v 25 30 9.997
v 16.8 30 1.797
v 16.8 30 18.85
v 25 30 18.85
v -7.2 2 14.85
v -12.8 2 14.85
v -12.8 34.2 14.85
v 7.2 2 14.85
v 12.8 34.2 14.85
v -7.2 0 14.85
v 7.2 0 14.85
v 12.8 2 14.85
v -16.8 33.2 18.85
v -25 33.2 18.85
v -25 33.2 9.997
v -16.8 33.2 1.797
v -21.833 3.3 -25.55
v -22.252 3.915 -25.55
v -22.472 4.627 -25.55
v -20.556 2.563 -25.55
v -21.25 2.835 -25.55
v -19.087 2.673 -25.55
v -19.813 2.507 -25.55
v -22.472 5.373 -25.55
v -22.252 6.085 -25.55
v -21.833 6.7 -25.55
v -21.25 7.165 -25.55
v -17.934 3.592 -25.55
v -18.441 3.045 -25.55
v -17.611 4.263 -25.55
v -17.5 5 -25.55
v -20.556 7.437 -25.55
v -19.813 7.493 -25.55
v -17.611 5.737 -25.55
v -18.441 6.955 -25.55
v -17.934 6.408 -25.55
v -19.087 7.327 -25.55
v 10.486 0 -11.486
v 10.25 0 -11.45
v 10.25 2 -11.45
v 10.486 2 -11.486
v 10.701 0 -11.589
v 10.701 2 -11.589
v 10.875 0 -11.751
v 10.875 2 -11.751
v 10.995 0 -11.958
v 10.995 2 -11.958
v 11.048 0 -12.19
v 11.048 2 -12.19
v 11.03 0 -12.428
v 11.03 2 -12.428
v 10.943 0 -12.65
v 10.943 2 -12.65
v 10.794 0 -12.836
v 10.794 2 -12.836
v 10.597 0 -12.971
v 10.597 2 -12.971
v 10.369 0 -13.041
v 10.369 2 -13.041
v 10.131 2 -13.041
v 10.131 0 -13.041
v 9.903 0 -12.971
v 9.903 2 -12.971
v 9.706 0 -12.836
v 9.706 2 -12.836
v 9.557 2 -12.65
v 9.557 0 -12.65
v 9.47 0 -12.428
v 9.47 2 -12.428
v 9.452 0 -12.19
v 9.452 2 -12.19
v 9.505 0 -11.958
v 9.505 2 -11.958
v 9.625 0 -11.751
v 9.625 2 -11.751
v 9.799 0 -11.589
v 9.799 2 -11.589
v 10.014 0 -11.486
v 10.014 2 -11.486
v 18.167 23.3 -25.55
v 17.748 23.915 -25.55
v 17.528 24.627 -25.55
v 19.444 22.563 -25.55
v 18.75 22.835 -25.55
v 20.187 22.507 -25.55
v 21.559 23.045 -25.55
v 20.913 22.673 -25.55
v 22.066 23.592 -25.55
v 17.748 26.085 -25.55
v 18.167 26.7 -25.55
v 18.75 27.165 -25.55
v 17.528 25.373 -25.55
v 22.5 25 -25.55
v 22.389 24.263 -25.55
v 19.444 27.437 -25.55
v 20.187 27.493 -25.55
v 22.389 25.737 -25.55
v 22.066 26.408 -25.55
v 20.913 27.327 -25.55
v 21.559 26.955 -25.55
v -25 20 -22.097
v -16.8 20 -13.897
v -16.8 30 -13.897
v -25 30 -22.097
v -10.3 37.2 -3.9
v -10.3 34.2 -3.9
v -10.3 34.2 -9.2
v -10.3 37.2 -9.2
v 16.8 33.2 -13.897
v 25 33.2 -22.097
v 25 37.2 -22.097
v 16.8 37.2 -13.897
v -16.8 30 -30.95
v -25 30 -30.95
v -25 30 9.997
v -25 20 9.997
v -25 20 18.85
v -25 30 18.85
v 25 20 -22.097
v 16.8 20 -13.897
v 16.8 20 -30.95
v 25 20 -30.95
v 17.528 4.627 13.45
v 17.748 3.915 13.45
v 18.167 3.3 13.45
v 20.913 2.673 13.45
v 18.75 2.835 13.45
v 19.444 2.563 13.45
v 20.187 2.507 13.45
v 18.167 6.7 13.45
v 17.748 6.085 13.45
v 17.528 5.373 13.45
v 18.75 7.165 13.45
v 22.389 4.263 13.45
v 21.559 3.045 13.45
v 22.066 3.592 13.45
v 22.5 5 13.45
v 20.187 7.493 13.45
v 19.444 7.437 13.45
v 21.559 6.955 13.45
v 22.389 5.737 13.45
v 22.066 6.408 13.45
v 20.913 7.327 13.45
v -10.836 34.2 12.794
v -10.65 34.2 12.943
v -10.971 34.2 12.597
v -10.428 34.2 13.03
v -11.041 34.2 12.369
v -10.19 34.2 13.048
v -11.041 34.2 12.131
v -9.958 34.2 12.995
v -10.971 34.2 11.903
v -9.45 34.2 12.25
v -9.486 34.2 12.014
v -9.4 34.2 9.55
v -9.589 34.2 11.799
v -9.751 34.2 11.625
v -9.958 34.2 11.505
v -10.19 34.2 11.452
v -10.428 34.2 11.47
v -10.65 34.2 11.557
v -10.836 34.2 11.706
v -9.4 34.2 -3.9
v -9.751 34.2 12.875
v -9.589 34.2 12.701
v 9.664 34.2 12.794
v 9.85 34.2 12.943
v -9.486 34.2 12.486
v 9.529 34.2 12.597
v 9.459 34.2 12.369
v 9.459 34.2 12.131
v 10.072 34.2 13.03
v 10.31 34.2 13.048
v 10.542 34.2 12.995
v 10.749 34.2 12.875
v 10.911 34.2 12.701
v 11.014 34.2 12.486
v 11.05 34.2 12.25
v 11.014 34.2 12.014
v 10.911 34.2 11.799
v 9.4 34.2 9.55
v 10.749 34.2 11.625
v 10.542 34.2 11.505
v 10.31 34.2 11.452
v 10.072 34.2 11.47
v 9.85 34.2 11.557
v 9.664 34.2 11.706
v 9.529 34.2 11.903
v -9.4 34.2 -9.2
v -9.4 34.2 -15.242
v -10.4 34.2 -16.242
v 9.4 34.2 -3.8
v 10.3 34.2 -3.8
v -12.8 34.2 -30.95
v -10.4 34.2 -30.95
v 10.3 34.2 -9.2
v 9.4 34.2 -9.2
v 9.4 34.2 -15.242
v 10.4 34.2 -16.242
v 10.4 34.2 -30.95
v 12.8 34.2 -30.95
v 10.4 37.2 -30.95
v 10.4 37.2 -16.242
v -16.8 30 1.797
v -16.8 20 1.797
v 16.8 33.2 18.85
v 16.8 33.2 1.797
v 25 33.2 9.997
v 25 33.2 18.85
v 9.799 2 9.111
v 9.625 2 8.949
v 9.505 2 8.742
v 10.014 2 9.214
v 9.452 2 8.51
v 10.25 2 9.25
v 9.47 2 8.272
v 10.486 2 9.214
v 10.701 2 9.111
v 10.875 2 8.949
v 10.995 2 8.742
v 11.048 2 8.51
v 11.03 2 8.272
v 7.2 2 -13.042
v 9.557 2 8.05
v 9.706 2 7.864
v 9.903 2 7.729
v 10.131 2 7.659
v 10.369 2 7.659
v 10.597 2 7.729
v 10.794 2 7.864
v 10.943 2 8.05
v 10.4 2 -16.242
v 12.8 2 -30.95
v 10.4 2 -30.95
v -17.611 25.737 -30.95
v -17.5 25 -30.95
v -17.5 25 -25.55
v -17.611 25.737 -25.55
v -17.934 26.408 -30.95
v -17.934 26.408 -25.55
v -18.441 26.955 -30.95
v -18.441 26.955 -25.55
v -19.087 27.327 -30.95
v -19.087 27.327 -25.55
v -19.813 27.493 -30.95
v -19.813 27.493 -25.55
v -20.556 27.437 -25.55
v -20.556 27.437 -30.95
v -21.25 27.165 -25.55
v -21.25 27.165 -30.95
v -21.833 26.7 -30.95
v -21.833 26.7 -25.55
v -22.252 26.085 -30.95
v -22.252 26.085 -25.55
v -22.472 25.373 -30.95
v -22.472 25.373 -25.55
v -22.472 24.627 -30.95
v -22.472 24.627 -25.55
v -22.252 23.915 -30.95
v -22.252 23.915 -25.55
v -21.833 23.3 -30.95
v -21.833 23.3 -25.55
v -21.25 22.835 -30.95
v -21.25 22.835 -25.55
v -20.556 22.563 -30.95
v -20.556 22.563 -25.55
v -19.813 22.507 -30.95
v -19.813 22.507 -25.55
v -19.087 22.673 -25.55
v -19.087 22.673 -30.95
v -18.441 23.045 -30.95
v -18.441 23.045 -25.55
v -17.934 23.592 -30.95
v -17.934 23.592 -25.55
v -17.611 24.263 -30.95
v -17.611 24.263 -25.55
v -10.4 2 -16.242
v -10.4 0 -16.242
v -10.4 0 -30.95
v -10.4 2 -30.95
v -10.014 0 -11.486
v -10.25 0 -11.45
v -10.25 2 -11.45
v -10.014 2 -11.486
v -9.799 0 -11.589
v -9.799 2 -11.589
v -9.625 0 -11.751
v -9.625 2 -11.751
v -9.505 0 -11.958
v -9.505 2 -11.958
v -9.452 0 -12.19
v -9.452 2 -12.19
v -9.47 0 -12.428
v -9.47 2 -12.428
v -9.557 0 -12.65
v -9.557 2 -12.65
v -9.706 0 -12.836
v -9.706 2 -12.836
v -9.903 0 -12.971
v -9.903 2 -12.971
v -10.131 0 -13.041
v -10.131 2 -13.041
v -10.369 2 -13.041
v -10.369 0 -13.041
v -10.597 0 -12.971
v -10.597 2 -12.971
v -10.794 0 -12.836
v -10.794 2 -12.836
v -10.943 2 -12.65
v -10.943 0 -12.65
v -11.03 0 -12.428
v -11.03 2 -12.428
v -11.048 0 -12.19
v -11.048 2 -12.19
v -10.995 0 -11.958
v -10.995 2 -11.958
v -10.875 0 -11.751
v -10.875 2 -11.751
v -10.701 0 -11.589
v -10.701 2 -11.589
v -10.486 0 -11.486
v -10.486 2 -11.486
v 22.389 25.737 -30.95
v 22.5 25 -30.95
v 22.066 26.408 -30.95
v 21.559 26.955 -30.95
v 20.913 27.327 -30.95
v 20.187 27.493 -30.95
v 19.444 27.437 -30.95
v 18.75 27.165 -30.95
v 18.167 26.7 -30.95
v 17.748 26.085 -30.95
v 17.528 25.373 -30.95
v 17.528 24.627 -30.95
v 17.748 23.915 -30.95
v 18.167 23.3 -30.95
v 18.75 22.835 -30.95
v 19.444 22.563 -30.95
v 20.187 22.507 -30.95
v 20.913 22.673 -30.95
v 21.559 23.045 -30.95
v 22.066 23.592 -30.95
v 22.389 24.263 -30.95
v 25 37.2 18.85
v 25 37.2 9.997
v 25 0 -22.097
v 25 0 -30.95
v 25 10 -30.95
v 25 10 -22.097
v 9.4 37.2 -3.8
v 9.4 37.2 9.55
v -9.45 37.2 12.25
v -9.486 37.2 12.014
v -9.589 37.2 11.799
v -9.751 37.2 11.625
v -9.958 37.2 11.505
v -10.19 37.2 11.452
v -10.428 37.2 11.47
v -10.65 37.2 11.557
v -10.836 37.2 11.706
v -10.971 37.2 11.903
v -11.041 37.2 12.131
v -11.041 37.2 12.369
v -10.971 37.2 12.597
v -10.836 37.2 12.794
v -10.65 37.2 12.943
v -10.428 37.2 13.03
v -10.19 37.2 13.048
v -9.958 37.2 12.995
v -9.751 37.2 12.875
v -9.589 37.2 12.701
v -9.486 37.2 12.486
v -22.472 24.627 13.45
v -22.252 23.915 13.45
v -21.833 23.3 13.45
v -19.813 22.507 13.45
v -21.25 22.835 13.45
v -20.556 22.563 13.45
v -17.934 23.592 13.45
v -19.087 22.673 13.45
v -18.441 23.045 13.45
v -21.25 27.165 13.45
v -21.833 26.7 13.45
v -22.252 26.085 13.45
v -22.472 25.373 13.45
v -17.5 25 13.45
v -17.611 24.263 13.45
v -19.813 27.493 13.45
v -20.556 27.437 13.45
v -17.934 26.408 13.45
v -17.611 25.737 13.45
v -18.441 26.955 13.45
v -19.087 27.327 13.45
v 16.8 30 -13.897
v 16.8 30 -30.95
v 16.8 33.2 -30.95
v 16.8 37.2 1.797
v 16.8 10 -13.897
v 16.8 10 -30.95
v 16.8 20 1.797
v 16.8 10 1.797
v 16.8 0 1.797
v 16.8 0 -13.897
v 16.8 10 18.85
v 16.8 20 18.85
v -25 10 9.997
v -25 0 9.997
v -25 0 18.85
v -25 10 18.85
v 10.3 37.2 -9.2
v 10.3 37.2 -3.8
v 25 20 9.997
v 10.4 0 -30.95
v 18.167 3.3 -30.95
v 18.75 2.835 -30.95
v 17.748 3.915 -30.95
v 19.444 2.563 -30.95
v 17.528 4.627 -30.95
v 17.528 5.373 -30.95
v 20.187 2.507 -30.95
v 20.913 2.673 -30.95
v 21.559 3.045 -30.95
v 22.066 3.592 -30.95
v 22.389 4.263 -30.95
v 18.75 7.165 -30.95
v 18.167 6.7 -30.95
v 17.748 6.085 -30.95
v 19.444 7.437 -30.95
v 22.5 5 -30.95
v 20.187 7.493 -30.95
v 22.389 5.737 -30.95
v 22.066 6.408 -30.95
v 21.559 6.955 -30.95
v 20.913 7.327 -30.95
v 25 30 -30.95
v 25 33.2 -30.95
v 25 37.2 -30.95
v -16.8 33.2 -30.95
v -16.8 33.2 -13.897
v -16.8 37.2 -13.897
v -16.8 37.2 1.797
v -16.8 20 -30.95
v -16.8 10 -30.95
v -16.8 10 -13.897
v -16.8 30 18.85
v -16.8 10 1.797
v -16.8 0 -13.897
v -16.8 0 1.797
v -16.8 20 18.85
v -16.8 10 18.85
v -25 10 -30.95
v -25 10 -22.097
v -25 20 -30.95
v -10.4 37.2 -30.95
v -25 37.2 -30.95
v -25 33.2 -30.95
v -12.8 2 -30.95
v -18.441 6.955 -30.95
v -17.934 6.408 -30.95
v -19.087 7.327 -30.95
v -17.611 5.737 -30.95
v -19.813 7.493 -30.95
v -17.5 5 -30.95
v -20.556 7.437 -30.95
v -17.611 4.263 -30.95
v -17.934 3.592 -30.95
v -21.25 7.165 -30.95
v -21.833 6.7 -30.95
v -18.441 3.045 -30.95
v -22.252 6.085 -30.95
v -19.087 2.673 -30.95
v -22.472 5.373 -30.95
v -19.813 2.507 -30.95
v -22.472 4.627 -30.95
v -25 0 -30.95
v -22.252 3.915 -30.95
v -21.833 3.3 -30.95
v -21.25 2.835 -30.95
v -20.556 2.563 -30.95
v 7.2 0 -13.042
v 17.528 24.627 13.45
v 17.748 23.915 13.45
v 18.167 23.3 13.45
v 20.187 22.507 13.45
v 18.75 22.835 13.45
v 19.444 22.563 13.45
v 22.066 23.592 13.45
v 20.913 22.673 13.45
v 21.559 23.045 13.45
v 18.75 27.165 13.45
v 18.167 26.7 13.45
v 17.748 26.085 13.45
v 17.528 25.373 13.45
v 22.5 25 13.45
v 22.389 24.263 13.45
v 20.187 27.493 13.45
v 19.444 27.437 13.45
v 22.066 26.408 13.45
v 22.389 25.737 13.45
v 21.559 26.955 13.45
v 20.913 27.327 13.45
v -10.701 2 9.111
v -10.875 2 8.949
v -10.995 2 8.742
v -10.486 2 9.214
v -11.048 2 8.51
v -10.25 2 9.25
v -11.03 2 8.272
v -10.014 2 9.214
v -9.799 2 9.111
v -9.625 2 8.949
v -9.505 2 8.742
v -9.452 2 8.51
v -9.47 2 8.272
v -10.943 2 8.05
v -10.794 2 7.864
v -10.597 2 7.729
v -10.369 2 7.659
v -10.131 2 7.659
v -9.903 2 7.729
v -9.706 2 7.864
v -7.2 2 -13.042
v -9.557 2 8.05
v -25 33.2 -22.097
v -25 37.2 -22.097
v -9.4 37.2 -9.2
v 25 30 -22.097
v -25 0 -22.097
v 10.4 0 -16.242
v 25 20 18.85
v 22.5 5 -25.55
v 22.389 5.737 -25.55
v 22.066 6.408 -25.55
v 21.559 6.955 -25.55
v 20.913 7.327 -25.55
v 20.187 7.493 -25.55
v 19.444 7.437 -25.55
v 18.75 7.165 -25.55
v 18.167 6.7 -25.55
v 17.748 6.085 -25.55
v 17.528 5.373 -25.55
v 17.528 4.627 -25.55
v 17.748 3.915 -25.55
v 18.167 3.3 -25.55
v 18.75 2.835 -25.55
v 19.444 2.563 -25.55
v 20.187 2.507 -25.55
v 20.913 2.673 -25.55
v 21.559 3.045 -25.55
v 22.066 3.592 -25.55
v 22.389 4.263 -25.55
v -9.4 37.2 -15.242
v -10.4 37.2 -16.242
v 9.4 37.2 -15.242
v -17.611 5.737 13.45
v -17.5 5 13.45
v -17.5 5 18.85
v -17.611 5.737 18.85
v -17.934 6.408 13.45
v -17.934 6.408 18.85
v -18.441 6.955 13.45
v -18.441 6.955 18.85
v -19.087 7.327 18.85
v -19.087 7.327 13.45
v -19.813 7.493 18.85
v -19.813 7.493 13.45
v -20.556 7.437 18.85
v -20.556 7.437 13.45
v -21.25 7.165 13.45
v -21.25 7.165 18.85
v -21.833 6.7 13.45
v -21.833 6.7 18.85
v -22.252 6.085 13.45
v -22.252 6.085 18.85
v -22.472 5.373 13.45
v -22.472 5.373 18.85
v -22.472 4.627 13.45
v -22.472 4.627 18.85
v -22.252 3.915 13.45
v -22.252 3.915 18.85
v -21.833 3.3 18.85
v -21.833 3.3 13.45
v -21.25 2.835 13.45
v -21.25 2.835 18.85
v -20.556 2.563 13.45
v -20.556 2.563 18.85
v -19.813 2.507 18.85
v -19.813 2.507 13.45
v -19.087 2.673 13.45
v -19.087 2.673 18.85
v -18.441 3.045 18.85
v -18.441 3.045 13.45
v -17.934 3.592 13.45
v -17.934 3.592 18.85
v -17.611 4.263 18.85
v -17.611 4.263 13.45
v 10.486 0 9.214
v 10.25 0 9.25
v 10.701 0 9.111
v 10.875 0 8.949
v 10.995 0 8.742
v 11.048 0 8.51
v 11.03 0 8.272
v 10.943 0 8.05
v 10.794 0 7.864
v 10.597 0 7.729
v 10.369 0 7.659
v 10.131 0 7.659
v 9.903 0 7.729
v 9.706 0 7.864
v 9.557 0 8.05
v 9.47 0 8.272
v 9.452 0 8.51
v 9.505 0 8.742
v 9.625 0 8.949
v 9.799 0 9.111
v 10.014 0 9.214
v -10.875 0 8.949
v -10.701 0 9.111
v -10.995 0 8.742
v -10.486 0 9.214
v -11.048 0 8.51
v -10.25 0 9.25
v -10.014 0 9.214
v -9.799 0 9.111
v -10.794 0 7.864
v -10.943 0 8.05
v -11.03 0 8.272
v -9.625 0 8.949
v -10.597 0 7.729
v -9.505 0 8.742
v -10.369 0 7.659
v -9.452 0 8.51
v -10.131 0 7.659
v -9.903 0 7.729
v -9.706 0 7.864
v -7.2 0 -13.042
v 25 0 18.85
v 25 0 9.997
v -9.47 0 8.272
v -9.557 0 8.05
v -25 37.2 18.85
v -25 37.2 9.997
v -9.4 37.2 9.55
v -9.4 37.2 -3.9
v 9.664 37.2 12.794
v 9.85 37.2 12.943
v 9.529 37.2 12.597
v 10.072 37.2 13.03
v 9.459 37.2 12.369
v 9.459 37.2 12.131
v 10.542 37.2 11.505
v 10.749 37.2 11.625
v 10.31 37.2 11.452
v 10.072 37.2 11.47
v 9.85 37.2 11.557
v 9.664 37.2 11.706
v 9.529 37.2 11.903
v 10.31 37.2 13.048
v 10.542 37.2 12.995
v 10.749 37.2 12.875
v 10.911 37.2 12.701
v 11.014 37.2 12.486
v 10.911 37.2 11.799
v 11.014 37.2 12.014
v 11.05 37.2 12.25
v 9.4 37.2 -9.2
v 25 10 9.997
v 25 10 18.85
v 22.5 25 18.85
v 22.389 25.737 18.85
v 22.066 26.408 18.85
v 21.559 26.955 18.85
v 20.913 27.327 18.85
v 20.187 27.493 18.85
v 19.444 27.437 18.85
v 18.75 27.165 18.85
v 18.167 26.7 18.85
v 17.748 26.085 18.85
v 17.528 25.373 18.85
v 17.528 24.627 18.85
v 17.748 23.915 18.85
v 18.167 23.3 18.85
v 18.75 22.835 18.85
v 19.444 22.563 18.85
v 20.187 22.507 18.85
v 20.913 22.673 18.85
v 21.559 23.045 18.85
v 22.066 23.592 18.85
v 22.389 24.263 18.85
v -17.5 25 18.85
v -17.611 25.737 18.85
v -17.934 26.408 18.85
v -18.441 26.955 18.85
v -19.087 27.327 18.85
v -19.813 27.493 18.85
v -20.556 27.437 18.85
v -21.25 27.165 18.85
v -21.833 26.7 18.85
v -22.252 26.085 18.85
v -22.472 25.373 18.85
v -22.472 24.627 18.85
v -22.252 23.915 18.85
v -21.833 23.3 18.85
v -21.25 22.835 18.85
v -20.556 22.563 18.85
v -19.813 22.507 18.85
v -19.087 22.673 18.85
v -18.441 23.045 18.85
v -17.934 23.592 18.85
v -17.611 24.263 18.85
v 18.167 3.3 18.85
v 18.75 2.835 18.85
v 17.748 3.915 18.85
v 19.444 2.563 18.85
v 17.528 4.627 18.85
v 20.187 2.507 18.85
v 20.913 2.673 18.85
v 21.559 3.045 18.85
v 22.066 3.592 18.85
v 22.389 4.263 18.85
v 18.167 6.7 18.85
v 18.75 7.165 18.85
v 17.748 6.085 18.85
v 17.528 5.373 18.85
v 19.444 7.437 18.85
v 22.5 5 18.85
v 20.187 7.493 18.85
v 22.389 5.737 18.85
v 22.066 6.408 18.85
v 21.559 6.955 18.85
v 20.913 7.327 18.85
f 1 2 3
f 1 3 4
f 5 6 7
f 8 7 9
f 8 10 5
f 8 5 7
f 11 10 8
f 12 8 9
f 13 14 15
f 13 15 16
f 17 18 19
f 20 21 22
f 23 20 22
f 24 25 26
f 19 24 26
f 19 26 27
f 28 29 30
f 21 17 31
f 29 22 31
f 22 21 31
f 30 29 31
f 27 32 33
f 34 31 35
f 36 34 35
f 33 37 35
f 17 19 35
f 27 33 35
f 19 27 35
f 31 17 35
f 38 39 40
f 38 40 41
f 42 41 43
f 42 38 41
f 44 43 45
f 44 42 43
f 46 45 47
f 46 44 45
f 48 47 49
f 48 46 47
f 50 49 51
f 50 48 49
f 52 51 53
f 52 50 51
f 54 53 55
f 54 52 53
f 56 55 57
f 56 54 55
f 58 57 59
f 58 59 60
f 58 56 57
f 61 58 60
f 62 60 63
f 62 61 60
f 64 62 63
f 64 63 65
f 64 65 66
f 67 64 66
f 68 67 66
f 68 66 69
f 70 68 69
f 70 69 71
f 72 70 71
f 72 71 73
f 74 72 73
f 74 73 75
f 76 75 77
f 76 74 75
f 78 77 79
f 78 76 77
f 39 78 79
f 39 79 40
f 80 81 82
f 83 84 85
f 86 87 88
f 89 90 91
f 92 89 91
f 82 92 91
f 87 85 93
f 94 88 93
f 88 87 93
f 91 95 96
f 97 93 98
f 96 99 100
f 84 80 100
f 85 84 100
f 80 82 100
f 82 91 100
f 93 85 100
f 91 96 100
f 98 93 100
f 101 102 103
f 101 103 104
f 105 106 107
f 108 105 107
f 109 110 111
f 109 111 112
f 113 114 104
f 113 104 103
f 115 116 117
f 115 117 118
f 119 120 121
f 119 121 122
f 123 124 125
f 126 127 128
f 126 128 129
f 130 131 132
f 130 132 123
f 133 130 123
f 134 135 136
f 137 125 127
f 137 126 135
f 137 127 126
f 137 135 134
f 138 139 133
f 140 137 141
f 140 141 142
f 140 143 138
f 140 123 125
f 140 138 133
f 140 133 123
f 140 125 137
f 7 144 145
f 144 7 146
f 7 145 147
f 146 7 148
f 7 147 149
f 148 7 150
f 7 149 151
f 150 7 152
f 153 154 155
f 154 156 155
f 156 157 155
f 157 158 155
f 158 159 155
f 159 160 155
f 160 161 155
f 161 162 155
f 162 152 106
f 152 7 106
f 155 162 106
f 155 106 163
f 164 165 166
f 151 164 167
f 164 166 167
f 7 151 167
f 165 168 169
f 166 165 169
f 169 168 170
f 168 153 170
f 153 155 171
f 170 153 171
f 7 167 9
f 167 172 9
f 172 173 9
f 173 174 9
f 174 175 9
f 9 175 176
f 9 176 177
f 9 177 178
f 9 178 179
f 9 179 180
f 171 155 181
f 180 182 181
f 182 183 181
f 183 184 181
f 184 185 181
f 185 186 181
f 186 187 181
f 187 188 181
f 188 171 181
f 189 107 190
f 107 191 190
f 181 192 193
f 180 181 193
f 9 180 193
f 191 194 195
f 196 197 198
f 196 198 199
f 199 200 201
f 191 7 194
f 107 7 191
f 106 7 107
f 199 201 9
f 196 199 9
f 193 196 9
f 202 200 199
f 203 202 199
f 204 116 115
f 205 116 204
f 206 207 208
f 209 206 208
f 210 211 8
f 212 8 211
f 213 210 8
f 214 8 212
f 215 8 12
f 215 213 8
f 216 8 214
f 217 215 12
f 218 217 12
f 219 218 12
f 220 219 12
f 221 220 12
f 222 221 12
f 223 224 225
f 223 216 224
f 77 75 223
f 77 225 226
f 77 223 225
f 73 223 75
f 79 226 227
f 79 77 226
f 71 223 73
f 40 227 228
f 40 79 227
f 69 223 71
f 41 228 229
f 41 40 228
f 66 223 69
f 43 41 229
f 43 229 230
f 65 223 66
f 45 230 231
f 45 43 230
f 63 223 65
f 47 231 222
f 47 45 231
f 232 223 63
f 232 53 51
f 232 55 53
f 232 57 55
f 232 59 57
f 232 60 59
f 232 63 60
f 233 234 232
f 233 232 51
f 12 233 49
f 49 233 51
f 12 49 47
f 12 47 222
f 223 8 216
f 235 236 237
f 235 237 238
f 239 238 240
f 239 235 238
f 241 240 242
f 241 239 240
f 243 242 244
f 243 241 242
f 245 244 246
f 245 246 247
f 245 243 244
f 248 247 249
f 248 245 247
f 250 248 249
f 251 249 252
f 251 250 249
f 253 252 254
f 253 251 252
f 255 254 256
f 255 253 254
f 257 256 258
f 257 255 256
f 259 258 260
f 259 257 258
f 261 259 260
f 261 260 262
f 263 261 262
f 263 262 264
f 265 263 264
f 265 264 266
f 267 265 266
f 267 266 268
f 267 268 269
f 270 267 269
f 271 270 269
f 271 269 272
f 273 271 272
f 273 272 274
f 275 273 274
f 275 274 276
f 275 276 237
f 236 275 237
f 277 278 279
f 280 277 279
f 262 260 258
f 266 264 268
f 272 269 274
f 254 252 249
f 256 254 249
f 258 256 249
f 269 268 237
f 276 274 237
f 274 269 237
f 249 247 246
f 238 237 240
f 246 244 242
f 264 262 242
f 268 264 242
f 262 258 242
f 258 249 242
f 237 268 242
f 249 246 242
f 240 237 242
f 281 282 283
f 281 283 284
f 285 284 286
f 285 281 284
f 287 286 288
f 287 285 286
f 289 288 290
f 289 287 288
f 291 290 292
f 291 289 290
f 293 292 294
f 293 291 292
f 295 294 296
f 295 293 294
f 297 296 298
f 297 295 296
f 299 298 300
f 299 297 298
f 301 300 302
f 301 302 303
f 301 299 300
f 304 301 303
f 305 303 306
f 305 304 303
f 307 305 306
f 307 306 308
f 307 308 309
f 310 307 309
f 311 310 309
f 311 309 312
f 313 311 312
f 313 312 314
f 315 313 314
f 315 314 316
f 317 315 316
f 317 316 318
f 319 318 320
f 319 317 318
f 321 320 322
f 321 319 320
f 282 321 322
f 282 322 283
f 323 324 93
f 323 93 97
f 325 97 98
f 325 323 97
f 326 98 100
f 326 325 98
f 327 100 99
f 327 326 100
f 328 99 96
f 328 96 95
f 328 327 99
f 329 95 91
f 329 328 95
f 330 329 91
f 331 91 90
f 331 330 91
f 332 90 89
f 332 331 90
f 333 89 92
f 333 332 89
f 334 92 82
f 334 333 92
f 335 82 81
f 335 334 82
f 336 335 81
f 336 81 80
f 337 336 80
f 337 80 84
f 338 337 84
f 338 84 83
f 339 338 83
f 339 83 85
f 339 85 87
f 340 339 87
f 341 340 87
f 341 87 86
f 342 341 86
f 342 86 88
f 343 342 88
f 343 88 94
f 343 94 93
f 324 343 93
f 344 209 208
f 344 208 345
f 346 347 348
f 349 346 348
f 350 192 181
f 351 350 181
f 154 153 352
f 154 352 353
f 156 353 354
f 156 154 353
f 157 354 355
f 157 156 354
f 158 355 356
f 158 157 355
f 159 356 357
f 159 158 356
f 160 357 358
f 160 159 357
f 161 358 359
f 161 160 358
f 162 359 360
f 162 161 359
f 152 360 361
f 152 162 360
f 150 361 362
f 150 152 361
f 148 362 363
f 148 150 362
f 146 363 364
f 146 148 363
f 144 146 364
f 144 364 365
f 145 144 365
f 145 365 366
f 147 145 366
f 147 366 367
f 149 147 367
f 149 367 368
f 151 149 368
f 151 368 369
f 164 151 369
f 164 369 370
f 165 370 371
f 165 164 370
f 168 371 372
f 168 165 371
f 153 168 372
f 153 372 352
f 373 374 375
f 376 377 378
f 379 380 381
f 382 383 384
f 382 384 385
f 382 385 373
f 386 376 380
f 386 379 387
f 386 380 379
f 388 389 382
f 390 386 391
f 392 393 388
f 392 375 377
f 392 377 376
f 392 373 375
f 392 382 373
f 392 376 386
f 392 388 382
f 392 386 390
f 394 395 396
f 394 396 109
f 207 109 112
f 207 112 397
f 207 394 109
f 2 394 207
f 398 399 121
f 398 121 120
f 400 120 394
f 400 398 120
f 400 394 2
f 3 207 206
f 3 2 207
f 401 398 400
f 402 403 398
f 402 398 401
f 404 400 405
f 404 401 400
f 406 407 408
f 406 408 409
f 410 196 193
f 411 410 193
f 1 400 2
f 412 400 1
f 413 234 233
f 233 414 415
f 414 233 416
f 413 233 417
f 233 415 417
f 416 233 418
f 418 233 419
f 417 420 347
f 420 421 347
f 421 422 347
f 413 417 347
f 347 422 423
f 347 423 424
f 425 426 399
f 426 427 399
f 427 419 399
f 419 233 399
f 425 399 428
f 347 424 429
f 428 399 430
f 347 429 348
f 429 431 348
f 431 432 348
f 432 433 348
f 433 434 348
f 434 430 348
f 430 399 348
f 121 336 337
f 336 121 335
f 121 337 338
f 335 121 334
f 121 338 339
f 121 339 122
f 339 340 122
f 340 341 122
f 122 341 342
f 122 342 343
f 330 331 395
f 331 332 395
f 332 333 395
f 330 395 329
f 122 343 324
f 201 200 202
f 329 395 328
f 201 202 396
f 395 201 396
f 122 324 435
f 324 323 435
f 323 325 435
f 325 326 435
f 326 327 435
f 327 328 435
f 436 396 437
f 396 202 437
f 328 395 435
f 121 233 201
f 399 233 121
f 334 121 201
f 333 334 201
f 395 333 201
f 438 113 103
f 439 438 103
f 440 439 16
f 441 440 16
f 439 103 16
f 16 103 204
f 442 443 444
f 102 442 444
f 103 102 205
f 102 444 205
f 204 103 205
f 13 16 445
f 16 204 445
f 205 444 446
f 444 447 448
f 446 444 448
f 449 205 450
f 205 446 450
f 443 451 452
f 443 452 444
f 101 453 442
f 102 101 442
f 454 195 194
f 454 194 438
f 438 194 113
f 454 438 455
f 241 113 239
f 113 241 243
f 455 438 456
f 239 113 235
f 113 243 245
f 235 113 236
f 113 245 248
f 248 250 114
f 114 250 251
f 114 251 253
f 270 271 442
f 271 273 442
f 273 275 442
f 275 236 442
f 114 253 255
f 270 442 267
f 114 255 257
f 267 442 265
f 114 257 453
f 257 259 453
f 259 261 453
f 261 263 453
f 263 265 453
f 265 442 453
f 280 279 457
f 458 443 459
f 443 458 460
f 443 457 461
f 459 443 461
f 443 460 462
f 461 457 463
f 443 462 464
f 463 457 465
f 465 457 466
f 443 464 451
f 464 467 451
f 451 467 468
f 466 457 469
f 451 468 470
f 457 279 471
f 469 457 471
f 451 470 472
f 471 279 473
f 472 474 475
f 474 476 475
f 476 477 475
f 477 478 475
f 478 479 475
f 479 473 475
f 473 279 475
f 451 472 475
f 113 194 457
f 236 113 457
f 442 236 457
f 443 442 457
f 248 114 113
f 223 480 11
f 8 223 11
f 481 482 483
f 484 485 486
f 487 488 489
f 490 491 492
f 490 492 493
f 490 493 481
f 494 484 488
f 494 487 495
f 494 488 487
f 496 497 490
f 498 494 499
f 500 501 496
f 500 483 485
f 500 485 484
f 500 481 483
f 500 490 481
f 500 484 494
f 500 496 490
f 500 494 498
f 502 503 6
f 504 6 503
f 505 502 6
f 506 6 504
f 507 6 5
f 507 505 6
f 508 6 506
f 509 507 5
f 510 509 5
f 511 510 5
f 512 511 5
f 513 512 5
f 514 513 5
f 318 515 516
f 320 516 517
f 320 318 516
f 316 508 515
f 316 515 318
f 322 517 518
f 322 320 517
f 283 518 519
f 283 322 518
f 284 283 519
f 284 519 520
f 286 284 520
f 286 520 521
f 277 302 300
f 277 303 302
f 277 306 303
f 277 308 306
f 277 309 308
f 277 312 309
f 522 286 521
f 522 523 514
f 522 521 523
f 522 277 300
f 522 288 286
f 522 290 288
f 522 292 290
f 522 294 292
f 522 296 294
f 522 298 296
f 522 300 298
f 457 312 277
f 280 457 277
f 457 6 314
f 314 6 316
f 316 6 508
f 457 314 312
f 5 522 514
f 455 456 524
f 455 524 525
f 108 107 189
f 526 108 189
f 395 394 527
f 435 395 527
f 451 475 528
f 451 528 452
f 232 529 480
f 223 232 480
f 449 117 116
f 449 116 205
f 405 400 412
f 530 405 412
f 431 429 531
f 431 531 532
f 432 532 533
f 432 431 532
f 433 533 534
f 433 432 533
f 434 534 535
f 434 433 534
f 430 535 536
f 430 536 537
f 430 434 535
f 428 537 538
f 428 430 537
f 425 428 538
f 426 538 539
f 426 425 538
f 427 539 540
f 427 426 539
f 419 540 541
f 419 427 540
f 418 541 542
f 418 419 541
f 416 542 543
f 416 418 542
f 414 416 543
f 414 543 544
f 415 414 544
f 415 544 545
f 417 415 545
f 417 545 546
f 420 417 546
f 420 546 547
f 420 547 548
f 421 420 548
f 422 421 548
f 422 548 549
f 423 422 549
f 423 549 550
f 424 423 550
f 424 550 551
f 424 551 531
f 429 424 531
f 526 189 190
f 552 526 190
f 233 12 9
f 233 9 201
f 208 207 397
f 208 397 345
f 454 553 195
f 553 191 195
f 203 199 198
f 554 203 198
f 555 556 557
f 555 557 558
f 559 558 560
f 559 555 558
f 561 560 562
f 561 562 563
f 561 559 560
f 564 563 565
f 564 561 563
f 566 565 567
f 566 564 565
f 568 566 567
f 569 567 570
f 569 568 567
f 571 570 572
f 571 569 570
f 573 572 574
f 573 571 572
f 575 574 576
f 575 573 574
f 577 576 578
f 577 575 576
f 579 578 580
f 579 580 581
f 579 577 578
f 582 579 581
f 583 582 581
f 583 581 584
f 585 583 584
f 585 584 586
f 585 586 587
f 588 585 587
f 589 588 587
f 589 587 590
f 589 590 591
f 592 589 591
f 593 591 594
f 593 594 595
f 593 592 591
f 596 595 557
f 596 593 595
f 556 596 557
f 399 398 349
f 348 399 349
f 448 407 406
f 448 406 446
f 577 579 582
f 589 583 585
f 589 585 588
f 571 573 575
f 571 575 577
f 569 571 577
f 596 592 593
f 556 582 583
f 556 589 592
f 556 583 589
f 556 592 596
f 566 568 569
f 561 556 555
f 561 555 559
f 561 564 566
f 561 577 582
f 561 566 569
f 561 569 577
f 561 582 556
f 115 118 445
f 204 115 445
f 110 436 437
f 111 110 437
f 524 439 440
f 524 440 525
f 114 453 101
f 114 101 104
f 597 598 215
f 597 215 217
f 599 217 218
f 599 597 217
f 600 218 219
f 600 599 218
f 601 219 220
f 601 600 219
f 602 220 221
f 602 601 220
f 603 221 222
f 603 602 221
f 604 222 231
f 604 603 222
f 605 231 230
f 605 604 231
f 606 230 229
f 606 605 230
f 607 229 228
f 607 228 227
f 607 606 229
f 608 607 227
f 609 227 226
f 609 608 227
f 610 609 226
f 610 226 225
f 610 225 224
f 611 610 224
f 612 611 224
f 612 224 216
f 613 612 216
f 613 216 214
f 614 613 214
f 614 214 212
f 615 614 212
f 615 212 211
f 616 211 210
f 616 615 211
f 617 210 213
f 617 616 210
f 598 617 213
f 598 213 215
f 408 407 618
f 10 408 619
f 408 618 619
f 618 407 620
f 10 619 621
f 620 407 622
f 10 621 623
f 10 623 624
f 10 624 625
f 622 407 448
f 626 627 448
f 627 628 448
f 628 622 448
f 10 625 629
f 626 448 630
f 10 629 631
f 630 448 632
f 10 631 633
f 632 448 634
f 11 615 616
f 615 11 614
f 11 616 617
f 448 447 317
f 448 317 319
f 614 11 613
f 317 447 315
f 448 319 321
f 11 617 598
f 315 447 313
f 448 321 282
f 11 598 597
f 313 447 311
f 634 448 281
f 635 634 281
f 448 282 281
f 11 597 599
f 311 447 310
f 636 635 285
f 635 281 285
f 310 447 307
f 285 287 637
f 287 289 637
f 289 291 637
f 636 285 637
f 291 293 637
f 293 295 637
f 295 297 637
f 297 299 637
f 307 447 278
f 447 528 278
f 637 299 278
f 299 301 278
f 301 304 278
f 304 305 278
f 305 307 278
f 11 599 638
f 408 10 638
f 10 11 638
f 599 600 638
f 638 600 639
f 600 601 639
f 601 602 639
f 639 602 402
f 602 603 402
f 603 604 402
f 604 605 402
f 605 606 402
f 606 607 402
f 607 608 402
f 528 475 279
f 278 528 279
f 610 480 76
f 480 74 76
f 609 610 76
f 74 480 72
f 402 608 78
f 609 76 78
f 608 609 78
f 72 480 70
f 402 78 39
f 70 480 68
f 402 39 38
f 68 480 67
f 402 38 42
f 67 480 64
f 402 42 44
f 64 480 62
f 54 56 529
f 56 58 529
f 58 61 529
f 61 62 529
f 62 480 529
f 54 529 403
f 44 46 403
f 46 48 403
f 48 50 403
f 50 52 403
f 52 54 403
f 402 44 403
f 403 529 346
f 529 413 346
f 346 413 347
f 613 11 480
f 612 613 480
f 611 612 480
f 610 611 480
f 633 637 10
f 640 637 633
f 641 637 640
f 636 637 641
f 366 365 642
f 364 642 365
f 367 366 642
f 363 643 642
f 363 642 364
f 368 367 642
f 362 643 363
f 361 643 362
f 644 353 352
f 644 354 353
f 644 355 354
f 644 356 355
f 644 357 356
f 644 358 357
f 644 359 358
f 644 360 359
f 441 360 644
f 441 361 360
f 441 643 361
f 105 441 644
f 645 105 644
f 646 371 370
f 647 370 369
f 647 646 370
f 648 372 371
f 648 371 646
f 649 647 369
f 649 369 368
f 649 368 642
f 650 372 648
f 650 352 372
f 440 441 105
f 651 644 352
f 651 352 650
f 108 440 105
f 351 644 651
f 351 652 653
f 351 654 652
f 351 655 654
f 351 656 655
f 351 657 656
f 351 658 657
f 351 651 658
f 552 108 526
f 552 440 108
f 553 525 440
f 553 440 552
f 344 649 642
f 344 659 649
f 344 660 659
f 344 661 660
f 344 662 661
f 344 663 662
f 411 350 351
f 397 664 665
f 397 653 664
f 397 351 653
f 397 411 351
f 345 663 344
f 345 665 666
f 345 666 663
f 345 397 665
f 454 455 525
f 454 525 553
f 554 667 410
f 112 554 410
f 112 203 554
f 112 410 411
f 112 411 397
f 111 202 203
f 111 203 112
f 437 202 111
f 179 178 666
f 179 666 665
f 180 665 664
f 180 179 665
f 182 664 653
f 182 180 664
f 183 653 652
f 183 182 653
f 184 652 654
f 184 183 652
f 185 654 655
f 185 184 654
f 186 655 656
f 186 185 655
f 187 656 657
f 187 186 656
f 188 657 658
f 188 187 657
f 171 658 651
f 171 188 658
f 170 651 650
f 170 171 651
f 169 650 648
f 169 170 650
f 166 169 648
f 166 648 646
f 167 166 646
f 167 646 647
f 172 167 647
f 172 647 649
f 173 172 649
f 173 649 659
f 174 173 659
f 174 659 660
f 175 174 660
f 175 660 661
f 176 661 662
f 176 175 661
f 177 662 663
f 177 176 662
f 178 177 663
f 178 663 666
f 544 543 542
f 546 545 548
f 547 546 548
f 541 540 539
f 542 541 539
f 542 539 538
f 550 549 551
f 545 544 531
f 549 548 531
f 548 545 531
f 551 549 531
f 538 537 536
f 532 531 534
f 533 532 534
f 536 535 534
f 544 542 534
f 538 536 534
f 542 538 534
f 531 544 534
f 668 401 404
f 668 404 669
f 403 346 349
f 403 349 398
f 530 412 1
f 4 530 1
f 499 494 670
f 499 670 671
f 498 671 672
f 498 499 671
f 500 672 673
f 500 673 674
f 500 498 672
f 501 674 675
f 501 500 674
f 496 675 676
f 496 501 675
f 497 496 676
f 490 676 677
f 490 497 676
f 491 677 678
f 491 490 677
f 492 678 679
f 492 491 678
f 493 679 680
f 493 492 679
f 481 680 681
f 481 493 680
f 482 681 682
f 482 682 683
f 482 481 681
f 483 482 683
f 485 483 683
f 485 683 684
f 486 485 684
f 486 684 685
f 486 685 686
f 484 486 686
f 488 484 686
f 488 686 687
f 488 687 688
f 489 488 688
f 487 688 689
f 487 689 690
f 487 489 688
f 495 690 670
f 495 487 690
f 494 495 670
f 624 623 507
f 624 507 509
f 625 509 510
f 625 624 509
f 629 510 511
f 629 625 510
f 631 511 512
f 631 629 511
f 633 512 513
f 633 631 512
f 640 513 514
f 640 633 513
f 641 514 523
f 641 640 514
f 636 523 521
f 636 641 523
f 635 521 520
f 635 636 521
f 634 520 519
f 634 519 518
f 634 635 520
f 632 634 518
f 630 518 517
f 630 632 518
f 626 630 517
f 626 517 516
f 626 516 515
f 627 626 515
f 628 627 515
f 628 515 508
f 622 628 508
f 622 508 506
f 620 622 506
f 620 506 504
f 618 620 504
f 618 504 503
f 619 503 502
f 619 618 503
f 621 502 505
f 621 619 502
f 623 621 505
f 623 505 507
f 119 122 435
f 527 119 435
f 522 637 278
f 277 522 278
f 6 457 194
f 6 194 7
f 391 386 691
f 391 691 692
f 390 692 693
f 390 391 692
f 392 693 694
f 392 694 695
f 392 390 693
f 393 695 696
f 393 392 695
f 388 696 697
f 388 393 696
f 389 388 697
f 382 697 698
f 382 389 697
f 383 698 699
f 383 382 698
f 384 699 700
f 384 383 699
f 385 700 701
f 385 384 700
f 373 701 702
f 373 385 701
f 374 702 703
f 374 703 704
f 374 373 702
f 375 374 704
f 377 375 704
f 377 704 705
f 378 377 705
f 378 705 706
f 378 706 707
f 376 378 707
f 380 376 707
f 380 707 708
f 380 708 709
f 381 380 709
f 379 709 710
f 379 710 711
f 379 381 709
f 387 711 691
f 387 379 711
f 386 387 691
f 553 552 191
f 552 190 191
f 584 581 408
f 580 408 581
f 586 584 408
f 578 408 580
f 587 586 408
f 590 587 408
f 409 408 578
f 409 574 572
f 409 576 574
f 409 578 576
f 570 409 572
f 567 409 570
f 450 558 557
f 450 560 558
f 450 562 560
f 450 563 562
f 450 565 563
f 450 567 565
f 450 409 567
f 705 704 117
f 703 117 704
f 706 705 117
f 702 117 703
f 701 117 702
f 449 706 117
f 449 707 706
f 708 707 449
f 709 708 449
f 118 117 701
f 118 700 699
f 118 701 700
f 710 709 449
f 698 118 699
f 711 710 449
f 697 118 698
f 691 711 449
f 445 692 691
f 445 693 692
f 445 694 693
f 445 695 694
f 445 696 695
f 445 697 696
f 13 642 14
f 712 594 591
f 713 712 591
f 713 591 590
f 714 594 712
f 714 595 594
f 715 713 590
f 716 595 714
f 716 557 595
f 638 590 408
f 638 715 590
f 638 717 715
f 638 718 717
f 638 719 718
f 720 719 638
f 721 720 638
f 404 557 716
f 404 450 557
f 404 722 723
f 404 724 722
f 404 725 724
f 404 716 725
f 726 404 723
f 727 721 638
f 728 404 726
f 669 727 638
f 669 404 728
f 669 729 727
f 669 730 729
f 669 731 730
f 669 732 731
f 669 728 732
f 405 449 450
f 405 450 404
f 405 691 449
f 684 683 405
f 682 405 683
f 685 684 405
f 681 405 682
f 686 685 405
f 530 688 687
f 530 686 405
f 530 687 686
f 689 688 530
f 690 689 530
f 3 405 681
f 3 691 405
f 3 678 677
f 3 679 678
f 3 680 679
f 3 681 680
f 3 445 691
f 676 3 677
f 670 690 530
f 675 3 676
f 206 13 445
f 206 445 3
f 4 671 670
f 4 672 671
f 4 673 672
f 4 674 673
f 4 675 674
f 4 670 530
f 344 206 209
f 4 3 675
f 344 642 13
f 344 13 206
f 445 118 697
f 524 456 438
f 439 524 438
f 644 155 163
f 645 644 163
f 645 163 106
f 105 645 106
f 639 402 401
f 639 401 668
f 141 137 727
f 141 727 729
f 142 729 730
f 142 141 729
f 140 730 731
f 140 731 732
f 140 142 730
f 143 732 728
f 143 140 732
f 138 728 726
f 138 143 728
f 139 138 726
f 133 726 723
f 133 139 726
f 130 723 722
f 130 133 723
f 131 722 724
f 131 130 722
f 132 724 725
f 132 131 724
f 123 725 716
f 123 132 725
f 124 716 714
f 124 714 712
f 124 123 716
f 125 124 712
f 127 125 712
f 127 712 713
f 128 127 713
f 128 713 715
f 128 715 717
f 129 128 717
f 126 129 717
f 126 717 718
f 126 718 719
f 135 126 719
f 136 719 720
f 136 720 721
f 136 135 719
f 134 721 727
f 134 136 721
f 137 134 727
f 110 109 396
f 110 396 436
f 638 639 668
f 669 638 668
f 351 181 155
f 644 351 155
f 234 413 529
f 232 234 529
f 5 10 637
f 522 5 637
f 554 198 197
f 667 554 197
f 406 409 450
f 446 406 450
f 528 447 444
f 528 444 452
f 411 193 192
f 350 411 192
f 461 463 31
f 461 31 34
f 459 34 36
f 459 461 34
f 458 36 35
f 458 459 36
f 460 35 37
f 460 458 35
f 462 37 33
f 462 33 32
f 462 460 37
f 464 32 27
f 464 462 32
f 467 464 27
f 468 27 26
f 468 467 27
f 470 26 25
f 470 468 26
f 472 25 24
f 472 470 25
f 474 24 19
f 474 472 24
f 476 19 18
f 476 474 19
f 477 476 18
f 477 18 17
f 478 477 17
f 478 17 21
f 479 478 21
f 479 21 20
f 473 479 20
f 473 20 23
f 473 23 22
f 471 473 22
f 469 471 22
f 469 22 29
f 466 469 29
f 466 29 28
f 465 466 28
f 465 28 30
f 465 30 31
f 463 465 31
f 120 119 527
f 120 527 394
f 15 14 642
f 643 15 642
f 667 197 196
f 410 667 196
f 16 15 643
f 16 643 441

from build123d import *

# Parameters (mm, degrees)
SKETCH1_R                 = 0.8
BOSS_EXTRUDE2_DEPTH       = 2.4
BOSS_EXTRUDE4_DEPTH       = 34.2
BOSS_EXTRUDE7_OUTLINE_R   = 0.8
BOSS_EXTRUDE7_DEPTH       = 37.2
SKETCH1_10_R              = 0.8
CUT_EXTRUDE6_DEPTH        = 34.2
SKETCH1_11_R              = 0.8
BOSS_EXTRUDE8_DEPTH       = 2
BOSS_EXTRUDE9_START       = -49.8
BOSS_EXTRUDE9_OUTLINE_W   = 8.2
BOSS_EXTRUDE9_OUTLINE_H   = 10
BOSS_EXTRUDE9_OUTLINE_R   = 2.5
BOSS_EXTRUDE9_OUTLINE_H_2 = 4
BOSS_EXTRUDE9_DEPTH       = 49.8
BOSS_EXTRUDE10_START      = -44.4
SKETCH9_3_R               = 2.5
BOSS_EXTRUDE10_DEPTH      = 44.4
CUT_EXTRUDE7_START        = -5.4
SKETCH9_4_R               = 2.5
CUT_EXTRUDE7_DEPTH        = 5.4
CUT_EXTRUDE8_START        = -37.2
CUT_EXTRUDE8_DEPTH        = 37.2
BOSS_EXTRUDE12_START      = -3
BOSS_EXTRUDE12_DEPTH      = 3


# Read off the part's stored shape, not the designer's step: Boss-Extrude7, Boss-Extrude9
with BuildPart() as part:
    # Sketch1 → Boss-Extrude2 (new body)
    with BuildSketch(Plane(origin=(0, 0, 0), x_dir=(1, 0, 0), z_dir=(0, 1, 0))):
        Polygon((-10.4, 16.242178951), (-10.4, 30.95), (-16.8, 30.95), (-16.8, -18.85), (16.8, -18.85), (16.8, 30.95), (10.4, 30.95), (10.4, 16.242178951), (7.2, 13.042178951), (7.2, -14.85), (-7.2, -14.85), (-7.2, 13.042178951), align=None)
        with Locations(Location((-10.25, -8.45, 0), (0, 0, 270))):
            Circle(SKETCH1_R, mode=Mode.SUBTRACT)
        with Locations(Location((-10.25, 12.25, 0), (0, 0, 270))):
            Circle(SKETCH1_R, mode=Mode.SUBTRACT)
        with Locations(Location((-10.25, -12.25, 0), (0, 0, 270))):
            Circle(SKETCH1_R, mode=Mode.SUBTRACT)
        with Locations(Location((10.25, -8.45, 0), (0, 0, 270))):
            Circle(SKETCH1_R, mode=Mode.SUBTRACT)
        with Locations(Location((10.25, -12.25, 0), (0, 0, 270))):
            Circle(SKETCH1_R, mode=Mode.SUBTRACT)
        with Locations(Location((10.25, 12.25, 0), (0, 0, 270))):
            Circle(SKETCH1_R, mode=Mode.SUBTRACT)
    extrude(amount=BOSS_EXTRUDE2_DEPTH)

    # Sketch1<6> → Boss-Extrude4 (add)
    with BuildSketch(Plane(origin=(0, 0, 0), x_dir=(1, 0, 0), z_dir=(0, 1, 0))):
        Polygon((-12.8, -14.85), (-12.8, 30.95), (-16.8, 30.95), (-16.8, -18.85), (16.8, -18.85), (16.8, 30.95), (12.8, 30.95), (12.8, -14.85), align=None)
    extrude(amount=BOSS_EXTRUDE4_DEPTH)

    # Boss-Extrude7 outline → Boss-Extrude7 (add)
    with BuildSketch(Plane(origin=(0, 0, 0), x_dir=(1, 0, 0), z_dir=(0, 1, 0))):
        Polygon((16.8, -18.85), (16.8, 30.95), (10.4, 30.95), (10.4, 16.242178951), (9.4, 15.242178951), (9.4, 9.2), (10.3, 9.2), (10.3, 3.8), (9.4, 3.8), (9.4, -9.55), (-9.4, -9.55), (-9.4, 3.9), (-10.3, 3.9), (-10.3, 9.2), (-9.4, 9.2), (-9.4, 15.242178951), (-10.4, 16.242178951), (-10.4, 30.95), (-16.8, 30.95), (-16.8, -18.85), align=None)
        with Locations((-10.25, 12.25)):
            Circle(BOSS_EXTRUDE7_OUTLINE_R, mode=Mode.SUBTRACT)
        with Locations((-10.25, -12.25)):
            Circle(BOSS_EXTRUDE7_OUTLINE_R, mode=Mode.SUBTRACT)
        with Locations((10.25, 12.25)):
            Circle(BOSS_EXTRUDE7_OUTLINE_R, mode=Mode.SUBTRACT)
        with Locations((10.25, -12.25)):
            Circle(BOSS_EXTRUDE7_OUTLINE_R, mode=Mode.SUBTRACT)
    extrude(amount=BOSS_EXTRUDE7_DEPTH)

    # Sketch1<10> → Cut-Extrude6 (cut)
    with BuildSketch(Plane(origin=(0, 0, 0), x_dir=(1, 0, 0), z_dir=(0, 1, 0))):
        Polygon((-10.4, 16.242178951), (-10.4, 30.95), (-12.8, 30.95), (-12.8, -14.85), (12.8, -14.85), (12.8, 30.95), (10.4, 30.95), (10.4, 16.242178951), (7.2, 13.042178951), (7.2, -9.55), (-7.2, -9.55), (-7.2, 13.042178951), align=None)
        with Locations(Location((-10.25, 12.25, 0), (0, 0, 270))):
            Circle(SKETCH1_10_R, mode=Mode.SUBTRACT)
        with Locations(Location((-10.25, -12.25, 0), (0, 0, 270))):
            Circle(SKETCH1_10_R, mode=Mode.SUBTRACT)
        with Locations(Location((10.25, -12.25, 0), (0, 0, 270))):
            Circle(SKETCH1_10_R, mode=Mode.SUBTRACT)
        with Locations(Location((10.25, 12.25, 0), (0, 0, 270))):
            Circle(SKETCH1_10_R, mode=Mode.SUBTRACT)
    extrude(amount=CUT_EXTRUDE6_DEPTH, mode=Mode.SUBTRACT)

    # Sketch1<11> → Boss-Extrude8 (add)
    # profile 1 of 2: a face of its own
    with BuildSketch(Plane(origin=(0, 0, 0), x_dir=(1, 0, 0), z_dir=(0, 1, 0))):
        Polygon((-10.4, 16.242178951), (-10.4, 30.95), (-12.8, 30.95), (-12.8, -14.85), (-7.2, -14.85), (-7.2, 13.042178951), align=None)
        with Locations(Location((-10.25, -8.45, 0), (0, 0, 270))):
            Circle(SKETCH1_11_R, mode=Mode.SUBTRACT)
        with Locations(Location((-10.25, 12.25, 0), (0, 0, 270))):
            Circle(SKETCH1_11_R, mode=Mode.SUBTRACT)
    # profile 2 of 2: a face of its own
    with BuildSketch(Plane(origin=(0, 0, 0), x_dir=(1, 0, 0), z_dir=(0, 1, 0))):
        Polygon((7.2, -14.85), (12.8, -14.85), (12.8, 30.95), (10.4, 30.95), (10.4, 16.242178951), (7.2, 13.042178951), align=None)
        with Locations(Location((10.25, -8.45, 0), (0, 0, 270))):
            Circle(SKETCH1_11_R, mode=Mode.SUBTRACT)
        with Locations(Location((10.25, 12.25, 0), (0, 0, 270))):
            Circle(SKETCH1_11_R, mode=Mode.SUBTRACT)
    extrude(amount=BOSS_EXTRUDE8_DEPTH)

    # Boss-Extrude9 outline → Boss-Extrude9 (add)
    # profile 1 of 6: a face of its own
    with BuildSketch(Plane.XY.offset(18.85).offset(BOSS_EXTRUDE9_START)):
        with Locations((20.9, 5)):
            Rectangle(BOSS_EXTRUDE9_OUTLINE_W, BOSS_EXTRUDE9_OUTLINE_H)
        with Locations((20, 5)):
            Circle(BOSS_EXTRUDE9_OUTLINE_R, mode=Mode.SUBTRACT)
    # profile 2 of 6: a face of its own
    with BuildSketch(Plane.XY.offset(18.85).offset(BOSS_EXTRUDE9_START)):
        with Locations((-20.9, 5)):
            Rectangle(BOSS_EXTRUDE9_OUTLINE_W, BOSS_EXTRUDE9_OUTLINE_H)
        with Locations((-20, 5)):
            Circle(BOSS_EXTRUDE9_OUTLINE_R, mode=Mode.SUBTRACT)
    # profile 3 of 6: a face of its own
    with BuildSketch(Plane.XY.offset(18.85).offset(BOSS_EXTRUDE9_START)):
        with Locations((20.9, 25)):
            Rectangle(BOSS_EXTRUDE9_OUTLINE_W, BOSS_EXTRUDE9_OUTLINE_H)
        with Locations((20, 25)):
            Circle(BOSS_EXTRUDE9_OUTLINE_R, mode=Mode.SUBTRACT)
    # profile 4 of 6: a face of its own
    with BuildSketch(Plane.XY.offset(18.85).offset(BOSS_EXTRUDE9_START)):
        with Locations((-20.9, 25)):
            Rectangle(BOSS_EXTRUDE9_OUTLINE_W, BOSS_EXTRUDE9_OUTLINE_H)
        with Locations((-20, 25)):
            Circle(BOSS_EXTRUDE9_OUTLINE_R, mode=Mode.SUBTRACT)
    # profile 5 of 6: a face of its own
    with BuildSketch(Plane.XY.offset(18.85).offset(BOSS_EXTRUDE9_START)):
        with Locations((20.9, 35.2)):
            Rectangle(BOSS_EXTRUDE9_OUTLINE_W, BOSS_EXTRUDE9_OUTLINE_H_2)
    # profile 6 of 6: a face of its own
    with BuildSketch(Plane.XY.offset(18.85).offset(BOSS_EXTRUDE9_START)):
        with Locations((-20.9, 35.2)):
            Rectangle(BOSS_EXTRUDE9_OUTLINE_W, BOSS_EXTRUDE9_OUTLINE_H_2)
    extrude(amount=BOSS_EXTRUDE9_DEPTH)

    # Sketch9<3> → Boss-Extrude10 (add)
    with BuildSketch(Plane.XY.offset(18.85).offset(BOSS_EXTRUDE10_START)):
        with Locations((-20, 25)):
            Circle(SKETCH9_3_R)
        with Locations((-20, 5)):
            Circle(SKETCH9_3_R)
        with Locations((20, 5)):
            Circle(SKETCH9_3_R)
        with Locations((20, 25)):
            Circle(SKETCH9_3_R)
    extrude(amount=BOSS_EXTRUDE10_DEPTH)

    # Sketch9<4> → Cut-Extrude7 (cut)
    with BuildSketch(Plane.XY.offset(18.85).offset(CUT_EXTRUDE7_START)):
        with Locations((-20, 25)):
            Circle(SKETCH9_4_R)
        with Locations((-20, 5)):
            Circle(SKETCH9_4_R)
        with Locations((20, 5)):
            Circle(SKETCH9_4_R)
        with Locations((20, 25)):
            Circle(SKETCH9_4_R)
    extrude(amount=CUT_EXTRUDE7_DEPTH, mode=Mode.SUBTRACT)

    # Sketch12 → Cut-Extrude8 (cut)
    with BuildSketch(Plane(origin=(0, 37.2, 0), x_dir=(1, 0, 0), z_dir=(0, 1, 0)).offset(CUT_EXTRUDE8_START)):
        Polygon((-16.8, 13.896914247), (-25, 22.096914247), (-25, -9.996914247), (-16.8, -1.796914247), align=None)
        Polygon((16.8, -1.796914247), (25, -9.996914247), (25, 22.096914247), (16.8, 13.896914247), align=None)
    extrude(amount=CUT_EXTRUDE8_DEPTH, mode=Mode.SUBTRACT)

    # Sketch14 → Boss-Extrude12 (add)
    with BuildSketch(Plane(origin=(0, 37.2, 0), x_dir=(1, 0, 0), z_dir=(0, 1, 0)).offset(BOSS_EXTRUDE12_START)):
        with BuildLine():
            ThreePointArc((-10.3, 13.048435971), (-11.05, 12.25), (-10.3, 11.451564029))
            Line((-10.3, 11.451564029), (-10.3, 13.048435971))
        make_face()
        with BuildLine():
            Line((-10.3, 13.048435971), (-10.3, 11.451564029))
            ThreePointArc((-10.3, 11.451564029), (-9.702277442, 11.666904811), (-9.45, 12.25))
            ThreePointArc((-9.45, 12.25), (-9.702277442, 12.833095189), (-10.3, 13.048435971))
        make_face()
        with BuildLine():
            ThreePointArc((10.3, 13.048435971), (9.45, 12.25), (10.3, 11.451564029))
            Line((10.3, 11.451564029), (10.3, 13.048435971))
        make_face()
        with BuildLine():
            Line((10.3, 13.048435971), (10.3, 11.451564029))
            ThreePointArc((10.3, 11.451564029), (10.833095189, 11.702277442), (11.05, 12.25))
            ThreePointArc((11.05, 12.25), (10.833095189, 12.797722558), (10.3, 13.048435971))
        make_face()
    extrude(amount=BOSS_EXTRUDE12_DEPTH)


solid = part.part
